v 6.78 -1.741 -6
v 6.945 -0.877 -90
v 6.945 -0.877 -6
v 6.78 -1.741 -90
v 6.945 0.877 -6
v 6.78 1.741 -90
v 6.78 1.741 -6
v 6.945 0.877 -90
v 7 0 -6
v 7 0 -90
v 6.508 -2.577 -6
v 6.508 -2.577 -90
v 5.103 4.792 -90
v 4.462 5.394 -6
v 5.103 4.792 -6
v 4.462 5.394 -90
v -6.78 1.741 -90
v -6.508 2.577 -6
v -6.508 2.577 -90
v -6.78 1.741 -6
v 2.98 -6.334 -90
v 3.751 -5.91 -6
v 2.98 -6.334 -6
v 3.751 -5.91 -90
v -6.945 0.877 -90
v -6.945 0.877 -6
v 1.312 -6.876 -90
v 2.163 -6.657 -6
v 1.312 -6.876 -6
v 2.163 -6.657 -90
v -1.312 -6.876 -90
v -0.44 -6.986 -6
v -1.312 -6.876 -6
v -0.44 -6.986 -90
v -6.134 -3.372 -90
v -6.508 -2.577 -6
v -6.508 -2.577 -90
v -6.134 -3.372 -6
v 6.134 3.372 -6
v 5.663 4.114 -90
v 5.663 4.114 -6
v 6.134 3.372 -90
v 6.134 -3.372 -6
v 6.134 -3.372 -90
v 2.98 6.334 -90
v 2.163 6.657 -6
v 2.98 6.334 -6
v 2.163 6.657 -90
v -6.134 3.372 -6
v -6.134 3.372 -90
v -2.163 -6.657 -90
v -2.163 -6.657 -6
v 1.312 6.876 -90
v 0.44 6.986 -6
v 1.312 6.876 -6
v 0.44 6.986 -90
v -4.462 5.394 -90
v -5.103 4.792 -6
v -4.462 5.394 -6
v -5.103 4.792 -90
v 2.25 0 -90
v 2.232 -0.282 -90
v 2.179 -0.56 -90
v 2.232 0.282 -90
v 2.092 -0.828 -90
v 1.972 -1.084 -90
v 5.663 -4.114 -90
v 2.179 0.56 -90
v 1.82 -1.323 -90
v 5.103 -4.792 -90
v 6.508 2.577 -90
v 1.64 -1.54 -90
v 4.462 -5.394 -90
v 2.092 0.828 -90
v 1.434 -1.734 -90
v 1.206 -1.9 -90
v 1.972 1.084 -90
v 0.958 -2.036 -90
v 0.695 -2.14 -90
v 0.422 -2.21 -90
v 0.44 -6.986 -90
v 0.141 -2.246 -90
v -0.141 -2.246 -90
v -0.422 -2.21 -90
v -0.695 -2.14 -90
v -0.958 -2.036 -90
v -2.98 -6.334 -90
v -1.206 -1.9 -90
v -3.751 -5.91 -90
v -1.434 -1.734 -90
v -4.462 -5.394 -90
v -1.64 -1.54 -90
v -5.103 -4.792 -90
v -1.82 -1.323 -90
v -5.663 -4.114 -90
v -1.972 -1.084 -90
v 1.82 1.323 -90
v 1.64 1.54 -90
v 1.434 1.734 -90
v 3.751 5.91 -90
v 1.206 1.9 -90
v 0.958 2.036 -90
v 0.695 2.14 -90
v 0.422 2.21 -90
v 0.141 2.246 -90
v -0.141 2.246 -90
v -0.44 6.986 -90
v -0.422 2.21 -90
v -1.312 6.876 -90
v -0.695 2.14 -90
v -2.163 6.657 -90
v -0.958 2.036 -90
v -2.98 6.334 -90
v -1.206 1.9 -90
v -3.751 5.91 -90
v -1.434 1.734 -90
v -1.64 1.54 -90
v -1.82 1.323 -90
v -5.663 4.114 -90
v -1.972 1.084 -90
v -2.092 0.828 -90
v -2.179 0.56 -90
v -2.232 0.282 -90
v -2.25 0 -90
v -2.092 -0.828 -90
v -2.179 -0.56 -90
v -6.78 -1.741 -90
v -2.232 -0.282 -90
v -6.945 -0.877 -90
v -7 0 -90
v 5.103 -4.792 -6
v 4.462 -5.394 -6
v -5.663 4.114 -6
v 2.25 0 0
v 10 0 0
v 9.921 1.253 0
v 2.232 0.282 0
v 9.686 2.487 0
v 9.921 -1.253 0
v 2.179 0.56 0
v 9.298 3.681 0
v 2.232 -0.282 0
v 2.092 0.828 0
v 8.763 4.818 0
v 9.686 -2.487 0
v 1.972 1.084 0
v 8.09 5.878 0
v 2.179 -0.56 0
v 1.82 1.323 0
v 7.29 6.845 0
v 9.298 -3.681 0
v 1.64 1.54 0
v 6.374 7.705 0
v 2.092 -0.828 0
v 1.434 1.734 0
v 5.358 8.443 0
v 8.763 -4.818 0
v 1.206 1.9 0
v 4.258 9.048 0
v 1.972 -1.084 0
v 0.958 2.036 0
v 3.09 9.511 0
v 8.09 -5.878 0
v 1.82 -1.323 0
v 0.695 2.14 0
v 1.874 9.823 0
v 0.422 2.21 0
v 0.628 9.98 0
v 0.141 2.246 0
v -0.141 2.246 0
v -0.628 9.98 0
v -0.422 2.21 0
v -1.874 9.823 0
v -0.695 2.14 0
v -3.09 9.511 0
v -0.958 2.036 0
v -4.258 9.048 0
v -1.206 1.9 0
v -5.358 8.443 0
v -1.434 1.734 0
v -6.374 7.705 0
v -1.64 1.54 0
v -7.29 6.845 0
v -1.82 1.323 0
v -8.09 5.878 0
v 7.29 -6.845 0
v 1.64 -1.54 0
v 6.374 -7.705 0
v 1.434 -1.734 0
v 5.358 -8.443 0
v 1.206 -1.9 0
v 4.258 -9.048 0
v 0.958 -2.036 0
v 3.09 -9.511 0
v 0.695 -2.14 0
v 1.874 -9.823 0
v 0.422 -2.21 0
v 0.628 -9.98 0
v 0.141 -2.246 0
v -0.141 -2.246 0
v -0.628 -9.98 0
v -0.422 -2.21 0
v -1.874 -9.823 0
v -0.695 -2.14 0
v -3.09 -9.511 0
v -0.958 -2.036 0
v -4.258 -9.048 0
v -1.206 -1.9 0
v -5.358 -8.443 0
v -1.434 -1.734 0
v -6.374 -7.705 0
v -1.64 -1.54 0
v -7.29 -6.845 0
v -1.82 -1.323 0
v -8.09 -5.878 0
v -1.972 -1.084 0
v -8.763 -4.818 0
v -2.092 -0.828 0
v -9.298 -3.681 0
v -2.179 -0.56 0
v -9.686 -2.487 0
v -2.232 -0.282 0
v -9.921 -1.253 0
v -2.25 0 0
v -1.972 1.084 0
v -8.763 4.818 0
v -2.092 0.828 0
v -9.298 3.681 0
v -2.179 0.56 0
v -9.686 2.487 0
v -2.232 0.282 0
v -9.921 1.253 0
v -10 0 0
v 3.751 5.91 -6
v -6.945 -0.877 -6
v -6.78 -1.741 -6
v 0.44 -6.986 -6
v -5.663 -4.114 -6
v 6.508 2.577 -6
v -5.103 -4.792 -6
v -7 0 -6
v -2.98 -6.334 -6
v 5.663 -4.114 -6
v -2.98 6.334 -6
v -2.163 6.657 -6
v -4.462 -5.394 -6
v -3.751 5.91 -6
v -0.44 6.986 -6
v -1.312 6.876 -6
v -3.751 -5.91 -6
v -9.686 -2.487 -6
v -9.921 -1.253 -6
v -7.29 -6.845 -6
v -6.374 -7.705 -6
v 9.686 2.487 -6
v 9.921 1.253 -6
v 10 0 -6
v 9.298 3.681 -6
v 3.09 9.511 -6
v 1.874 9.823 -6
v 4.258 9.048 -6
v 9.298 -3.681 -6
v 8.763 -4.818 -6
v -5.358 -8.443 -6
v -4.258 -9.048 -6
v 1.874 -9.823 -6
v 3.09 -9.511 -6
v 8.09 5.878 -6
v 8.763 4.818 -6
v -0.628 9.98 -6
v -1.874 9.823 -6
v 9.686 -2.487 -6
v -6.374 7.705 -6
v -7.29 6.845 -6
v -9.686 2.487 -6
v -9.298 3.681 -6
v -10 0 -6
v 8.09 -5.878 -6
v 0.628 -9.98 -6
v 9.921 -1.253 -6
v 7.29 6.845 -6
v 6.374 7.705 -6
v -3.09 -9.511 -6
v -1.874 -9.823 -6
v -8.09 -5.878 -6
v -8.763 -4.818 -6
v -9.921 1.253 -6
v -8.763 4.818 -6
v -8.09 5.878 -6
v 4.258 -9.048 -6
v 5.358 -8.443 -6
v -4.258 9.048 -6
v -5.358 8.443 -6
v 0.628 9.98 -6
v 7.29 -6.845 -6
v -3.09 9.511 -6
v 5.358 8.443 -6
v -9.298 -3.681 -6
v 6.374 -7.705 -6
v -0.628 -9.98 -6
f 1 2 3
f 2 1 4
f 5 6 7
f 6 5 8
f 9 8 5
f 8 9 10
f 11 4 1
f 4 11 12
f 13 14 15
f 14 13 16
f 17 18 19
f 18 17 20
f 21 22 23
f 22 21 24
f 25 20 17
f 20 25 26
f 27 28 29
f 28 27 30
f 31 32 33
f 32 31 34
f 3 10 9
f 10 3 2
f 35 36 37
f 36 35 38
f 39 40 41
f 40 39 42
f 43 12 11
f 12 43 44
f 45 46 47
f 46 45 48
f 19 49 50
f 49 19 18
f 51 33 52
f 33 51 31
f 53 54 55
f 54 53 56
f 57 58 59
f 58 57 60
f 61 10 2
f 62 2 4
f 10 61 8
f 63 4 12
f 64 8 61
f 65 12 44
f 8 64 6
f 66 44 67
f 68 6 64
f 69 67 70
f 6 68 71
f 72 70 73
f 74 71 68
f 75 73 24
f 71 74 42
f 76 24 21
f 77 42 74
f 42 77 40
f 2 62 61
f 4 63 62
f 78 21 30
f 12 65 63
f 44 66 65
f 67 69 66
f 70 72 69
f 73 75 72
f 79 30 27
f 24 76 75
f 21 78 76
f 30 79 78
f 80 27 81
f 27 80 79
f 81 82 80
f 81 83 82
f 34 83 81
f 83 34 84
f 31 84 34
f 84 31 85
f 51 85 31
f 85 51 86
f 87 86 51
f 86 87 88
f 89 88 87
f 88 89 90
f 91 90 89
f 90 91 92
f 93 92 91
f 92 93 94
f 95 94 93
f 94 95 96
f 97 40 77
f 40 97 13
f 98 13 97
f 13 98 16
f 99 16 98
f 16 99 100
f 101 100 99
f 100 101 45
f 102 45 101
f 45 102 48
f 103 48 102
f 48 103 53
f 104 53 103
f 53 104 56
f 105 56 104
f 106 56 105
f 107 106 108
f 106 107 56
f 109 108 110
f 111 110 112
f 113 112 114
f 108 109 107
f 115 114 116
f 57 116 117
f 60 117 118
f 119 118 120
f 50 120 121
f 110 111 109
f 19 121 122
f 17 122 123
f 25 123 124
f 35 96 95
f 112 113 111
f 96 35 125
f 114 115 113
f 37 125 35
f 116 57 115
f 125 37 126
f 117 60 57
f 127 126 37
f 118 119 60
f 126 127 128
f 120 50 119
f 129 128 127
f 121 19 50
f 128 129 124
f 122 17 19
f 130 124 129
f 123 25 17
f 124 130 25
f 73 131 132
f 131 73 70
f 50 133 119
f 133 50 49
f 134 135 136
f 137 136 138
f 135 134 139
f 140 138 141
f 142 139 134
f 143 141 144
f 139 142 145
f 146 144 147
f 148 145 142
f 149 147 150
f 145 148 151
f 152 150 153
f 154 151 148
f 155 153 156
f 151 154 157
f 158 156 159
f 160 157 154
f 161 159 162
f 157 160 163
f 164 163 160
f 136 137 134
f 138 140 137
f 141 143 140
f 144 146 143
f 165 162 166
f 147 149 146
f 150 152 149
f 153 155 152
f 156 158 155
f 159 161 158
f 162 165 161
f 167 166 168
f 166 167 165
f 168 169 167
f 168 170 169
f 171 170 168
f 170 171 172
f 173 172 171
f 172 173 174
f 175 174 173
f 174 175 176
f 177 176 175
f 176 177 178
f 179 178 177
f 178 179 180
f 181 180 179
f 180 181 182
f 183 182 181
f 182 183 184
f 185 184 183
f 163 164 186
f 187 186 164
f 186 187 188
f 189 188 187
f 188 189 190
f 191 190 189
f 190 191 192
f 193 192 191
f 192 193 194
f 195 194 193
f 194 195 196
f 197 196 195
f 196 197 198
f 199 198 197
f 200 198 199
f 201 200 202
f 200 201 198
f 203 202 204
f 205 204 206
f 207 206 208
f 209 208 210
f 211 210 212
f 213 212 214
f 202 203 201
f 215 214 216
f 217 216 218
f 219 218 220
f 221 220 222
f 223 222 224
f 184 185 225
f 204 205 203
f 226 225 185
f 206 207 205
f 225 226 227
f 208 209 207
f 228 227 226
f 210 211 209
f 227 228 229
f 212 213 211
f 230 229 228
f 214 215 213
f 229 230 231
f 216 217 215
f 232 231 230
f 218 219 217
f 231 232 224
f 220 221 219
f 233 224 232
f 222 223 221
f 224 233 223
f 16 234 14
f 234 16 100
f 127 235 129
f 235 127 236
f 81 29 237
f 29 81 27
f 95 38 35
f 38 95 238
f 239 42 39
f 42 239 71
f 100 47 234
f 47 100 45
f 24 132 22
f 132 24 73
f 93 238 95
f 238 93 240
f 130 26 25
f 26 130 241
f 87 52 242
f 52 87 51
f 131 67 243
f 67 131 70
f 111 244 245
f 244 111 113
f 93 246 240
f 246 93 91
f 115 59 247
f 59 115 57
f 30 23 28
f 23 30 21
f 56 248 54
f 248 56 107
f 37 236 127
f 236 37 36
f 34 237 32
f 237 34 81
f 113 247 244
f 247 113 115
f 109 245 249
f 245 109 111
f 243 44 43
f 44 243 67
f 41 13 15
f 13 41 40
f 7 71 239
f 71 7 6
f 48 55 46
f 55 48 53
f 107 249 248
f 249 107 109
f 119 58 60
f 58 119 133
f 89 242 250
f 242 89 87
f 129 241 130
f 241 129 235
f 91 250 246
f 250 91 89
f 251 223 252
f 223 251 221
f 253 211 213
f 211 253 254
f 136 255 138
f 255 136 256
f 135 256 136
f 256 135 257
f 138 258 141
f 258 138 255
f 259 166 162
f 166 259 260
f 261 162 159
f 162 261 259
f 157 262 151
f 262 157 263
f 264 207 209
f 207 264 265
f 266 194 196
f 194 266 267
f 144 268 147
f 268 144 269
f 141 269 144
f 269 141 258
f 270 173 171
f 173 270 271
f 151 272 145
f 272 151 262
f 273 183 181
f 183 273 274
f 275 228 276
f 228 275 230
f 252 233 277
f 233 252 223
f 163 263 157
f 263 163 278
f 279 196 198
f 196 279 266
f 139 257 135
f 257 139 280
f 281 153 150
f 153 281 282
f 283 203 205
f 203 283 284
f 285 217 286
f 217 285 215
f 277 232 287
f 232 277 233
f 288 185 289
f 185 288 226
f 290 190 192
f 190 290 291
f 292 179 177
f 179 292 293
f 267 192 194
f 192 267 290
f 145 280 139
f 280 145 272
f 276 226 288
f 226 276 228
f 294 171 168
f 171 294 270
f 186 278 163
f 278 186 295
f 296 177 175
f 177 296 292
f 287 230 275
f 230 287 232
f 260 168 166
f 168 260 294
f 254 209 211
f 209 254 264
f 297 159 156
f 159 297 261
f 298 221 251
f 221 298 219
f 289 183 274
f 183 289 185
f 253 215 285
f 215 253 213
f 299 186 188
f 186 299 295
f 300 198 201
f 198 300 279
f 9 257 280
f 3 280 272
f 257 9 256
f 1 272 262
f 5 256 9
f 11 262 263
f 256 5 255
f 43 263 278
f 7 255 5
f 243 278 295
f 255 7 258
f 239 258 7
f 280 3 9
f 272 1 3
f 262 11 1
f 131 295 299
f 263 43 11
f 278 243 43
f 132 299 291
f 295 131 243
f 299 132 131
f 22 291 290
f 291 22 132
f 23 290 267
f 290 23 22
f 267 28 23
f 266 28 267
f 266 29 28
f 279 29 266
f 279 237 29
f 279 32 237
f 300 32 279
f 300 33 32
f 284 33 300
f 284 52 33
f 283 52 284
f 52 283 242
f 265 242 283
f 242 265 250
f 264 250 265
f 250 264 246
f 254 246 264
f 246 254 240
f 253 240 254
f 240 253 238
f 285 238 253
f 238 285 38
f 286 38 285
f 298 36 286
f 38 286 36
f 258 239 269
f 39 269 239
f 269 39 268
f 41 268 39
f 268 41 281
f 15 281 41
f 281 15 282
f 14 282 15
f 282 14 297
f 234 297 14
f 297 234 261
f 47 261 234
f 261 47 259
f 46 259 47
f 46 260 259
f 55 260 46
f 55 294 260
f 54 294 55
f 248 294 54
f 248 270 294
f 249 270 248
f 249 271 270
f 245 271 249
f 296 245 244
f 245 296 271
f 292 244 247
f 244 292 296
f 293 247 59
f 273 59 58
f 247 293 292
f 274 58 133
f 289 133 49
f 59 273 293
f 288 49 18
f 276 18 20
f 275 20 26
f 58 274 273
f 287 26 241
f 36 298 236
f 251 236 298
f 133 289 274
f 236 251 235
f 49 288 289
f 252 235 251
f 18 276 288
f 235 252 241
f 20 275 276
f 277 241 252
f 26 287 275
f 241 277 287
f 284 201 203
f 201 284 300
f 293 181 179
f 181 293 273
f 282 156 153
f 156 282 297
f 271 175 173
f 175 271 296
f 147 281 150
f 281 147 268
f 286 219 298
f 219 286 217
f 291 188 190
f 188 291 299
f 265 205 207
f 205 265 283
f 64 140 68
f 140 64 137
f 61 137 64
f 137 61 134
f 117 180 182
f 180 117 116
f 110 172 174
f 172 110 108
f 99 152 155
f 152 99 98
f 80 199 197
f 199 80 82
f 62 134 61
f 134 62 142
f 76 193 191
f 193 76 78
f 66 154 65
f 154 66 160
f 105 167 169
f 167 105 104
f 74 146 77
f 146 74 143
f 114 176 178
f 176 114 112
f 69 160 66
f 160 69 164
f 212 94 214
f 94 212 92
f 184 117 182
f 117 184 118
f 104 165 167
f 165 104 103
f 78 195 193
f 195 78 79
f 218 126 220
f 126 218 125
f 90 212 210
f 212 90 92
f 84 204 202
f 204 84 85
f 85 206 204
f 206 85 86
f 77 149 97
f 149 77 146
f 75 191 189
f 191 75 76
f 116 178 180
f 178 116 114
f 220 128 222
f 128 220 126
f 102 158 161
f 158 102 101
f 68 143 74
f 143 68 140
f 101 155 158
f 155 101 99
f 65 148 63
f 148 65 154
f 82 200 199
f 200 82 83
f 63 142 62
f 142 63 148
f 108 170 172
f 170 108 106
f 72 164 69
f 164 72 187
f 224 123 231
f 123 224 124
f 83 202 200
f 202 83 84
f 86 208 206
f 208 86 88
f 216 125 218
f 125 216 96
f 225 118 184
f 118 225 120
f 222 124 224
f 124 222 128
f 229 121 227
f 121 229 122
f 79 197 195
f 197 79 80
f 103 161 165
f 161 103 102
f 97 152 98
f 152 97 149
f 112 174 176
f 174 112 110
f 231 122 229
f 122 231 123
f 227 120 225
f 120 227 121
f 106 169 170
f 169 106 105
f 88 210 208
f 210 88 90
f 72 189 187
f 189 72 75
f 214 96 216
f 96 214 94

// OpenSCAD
$fn = 50;


difference() {
	union() {
		translate(v = [0, 0, -90.0000000000]) {
			cylinder(h = 90, r = 7.0000000000);
		}
		translate(v = [0, 0, -6.0000000000]) {
			cylinder(h = 6, r = 10.0000000000);
		}
	}
	union() {
		#translate(v = [0, 0, -90]) {
			cylinder(h = 90, r = 2.2500000000);
		}
	}
}
